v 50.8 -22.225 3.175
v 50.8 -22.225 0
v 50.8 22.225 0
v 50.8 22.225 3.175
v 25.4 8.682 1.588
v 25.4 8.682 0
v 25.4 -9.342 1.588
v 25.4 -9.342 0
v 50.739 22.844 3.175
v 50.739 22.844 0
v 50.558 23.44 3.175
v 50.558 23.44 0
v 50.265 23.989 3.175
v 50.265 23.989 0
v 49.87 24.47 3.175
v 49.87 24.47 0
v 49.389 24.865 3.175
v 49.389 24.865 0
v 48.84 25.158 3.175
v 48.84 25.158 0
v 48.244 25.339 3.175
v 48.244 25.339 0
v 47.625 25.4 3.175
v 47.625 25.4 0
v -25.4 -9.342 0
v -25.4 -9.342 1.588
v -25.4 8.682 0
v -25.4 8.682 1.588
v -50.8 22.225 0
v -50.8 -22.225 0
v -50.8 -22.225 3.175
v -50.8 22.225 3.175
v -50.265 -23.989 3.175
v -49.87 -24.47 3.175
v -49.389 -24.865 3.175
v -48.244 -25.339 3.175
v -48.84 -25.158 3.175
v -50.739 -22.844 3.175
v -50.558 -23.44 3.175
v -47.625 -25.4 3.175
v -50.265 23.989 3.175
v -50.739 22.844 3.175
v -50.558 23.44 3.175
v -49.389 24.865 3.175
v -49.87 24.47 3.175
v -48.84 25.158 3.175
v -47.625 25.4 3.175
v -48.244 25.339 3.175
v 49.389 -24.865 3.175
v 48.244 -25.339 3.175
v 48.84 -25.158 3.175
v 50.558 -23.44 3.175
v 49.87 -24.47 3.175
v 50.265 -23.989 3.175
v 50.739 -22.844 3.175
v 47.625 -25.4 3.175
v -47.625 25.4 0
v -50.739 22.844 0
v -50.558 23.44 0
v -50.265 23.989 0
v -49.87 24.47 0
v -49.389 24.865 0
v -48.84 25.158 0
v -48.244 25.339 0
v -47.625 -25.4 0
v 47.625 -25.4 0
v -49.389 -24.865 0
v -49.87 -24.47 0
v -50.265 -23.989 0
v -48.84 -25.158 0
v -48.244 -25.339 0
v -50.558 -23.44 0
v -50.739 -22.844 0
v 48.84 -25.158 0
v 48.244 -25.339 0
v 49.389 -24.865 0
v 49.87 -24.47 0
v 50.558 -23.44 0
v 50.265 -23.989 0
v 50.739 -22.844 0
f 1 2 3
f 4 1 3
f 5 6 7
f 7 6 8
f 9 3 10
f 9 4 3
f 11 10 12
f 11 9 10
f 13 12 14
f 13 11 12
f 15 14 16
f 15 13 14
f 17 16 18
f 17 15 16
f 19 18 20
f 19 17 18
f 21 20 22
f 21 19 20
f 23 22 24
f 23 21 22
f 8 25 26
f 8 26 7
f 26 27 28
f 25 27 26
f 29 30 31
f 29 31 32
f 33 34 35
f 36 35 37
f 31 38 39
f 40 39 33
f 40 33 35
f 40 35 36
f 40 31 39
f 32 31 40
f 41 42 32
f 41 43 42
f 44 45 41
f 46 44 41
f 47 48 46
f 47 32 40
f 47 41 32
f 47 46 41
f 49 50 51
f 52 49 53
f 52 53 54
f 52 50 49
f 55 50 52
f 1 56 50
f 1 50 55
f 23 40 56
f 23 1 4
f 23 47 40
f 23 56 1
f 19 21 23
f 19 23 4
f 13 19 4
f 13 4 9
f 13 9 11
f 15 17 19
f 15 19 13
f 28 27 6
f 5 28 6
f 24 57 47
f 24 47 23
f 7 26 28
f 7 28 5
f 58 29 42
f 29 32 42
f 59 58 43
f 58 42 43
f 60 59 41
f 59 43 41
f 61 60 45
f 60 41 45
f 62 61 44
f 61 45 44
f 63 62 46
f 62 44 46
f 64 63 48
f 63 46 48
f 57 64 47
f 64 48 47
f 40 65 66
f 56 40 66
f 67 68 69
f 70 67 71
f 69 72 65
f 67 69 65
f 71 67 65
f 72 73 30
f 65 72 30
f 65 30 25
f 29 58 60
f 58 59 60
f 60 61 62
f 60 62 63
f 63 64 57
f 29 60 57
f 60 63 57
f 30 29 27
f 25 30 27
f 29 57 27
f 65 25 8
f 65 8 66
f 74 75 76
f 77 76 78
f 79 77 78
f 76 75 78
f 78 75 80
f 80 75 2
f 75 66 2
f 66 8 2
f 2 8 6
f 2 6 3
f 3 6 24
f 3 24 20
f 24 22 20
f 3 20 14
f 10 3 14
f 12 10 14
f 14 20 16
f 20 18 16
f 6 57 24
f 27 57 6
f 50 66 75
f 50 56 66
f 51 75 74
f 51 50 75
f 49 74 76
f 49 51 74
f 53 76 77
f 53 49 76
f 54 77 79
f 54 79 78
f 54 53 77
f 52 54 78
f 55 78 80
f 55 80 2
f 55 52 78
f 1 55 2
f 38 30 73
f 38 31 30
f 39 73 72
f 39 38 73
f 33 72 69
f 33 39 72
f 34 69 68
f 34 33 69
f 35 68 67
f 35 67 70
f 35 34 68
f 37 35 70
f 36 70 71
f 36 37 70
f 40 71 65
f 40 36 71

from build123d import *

# Parameters (mm, degrees)
SKETCH_W     = 101.6
SKETCH_H     = 50.8
PAD_DEPTH    = 3.175
FILLET_R     = 3.175
SKETCH001_W  = 50.8
SKETCH001_H  = 18.023603
POCKET_DEPTH = 1.5875


with BuildPart() as part:
    # Sketch → Pad (new body)
    with BuildSketch(Plane.XY):
        Rectangle(SKETCH_W, SKETCH_H)
    extrude(amount=PAD_DEPTH)

    # Fillet
    fillet_edges = [part.edges().sort_by_distance(p)[0] for p in [
        (-50.8, 25.4, 1.5875),
        (50.8, 25.4, 1.5875),
        (50.8, -25.4, 1.5875),
        (-50.8, -25.4, 1.5875),
    ]]
    fillet(fillet_edges, radius=FILLET_R)

    # Sketch001 (on Sketch) → Pocket (cut, symmetric)
    with BuildSketch(Plane(origin=(0, 0, 0), x_dir=(1, 0, 0), z_dir=(0, 0, -1))):
        with Locations((0, 0.329702)):
            Rectangle(SKETCH001_W, SKETCH001_H)
    extrude(amount=POCKET_DEPTH, both=True, mode=Mode.SUBTRACT)


solid = part.part
